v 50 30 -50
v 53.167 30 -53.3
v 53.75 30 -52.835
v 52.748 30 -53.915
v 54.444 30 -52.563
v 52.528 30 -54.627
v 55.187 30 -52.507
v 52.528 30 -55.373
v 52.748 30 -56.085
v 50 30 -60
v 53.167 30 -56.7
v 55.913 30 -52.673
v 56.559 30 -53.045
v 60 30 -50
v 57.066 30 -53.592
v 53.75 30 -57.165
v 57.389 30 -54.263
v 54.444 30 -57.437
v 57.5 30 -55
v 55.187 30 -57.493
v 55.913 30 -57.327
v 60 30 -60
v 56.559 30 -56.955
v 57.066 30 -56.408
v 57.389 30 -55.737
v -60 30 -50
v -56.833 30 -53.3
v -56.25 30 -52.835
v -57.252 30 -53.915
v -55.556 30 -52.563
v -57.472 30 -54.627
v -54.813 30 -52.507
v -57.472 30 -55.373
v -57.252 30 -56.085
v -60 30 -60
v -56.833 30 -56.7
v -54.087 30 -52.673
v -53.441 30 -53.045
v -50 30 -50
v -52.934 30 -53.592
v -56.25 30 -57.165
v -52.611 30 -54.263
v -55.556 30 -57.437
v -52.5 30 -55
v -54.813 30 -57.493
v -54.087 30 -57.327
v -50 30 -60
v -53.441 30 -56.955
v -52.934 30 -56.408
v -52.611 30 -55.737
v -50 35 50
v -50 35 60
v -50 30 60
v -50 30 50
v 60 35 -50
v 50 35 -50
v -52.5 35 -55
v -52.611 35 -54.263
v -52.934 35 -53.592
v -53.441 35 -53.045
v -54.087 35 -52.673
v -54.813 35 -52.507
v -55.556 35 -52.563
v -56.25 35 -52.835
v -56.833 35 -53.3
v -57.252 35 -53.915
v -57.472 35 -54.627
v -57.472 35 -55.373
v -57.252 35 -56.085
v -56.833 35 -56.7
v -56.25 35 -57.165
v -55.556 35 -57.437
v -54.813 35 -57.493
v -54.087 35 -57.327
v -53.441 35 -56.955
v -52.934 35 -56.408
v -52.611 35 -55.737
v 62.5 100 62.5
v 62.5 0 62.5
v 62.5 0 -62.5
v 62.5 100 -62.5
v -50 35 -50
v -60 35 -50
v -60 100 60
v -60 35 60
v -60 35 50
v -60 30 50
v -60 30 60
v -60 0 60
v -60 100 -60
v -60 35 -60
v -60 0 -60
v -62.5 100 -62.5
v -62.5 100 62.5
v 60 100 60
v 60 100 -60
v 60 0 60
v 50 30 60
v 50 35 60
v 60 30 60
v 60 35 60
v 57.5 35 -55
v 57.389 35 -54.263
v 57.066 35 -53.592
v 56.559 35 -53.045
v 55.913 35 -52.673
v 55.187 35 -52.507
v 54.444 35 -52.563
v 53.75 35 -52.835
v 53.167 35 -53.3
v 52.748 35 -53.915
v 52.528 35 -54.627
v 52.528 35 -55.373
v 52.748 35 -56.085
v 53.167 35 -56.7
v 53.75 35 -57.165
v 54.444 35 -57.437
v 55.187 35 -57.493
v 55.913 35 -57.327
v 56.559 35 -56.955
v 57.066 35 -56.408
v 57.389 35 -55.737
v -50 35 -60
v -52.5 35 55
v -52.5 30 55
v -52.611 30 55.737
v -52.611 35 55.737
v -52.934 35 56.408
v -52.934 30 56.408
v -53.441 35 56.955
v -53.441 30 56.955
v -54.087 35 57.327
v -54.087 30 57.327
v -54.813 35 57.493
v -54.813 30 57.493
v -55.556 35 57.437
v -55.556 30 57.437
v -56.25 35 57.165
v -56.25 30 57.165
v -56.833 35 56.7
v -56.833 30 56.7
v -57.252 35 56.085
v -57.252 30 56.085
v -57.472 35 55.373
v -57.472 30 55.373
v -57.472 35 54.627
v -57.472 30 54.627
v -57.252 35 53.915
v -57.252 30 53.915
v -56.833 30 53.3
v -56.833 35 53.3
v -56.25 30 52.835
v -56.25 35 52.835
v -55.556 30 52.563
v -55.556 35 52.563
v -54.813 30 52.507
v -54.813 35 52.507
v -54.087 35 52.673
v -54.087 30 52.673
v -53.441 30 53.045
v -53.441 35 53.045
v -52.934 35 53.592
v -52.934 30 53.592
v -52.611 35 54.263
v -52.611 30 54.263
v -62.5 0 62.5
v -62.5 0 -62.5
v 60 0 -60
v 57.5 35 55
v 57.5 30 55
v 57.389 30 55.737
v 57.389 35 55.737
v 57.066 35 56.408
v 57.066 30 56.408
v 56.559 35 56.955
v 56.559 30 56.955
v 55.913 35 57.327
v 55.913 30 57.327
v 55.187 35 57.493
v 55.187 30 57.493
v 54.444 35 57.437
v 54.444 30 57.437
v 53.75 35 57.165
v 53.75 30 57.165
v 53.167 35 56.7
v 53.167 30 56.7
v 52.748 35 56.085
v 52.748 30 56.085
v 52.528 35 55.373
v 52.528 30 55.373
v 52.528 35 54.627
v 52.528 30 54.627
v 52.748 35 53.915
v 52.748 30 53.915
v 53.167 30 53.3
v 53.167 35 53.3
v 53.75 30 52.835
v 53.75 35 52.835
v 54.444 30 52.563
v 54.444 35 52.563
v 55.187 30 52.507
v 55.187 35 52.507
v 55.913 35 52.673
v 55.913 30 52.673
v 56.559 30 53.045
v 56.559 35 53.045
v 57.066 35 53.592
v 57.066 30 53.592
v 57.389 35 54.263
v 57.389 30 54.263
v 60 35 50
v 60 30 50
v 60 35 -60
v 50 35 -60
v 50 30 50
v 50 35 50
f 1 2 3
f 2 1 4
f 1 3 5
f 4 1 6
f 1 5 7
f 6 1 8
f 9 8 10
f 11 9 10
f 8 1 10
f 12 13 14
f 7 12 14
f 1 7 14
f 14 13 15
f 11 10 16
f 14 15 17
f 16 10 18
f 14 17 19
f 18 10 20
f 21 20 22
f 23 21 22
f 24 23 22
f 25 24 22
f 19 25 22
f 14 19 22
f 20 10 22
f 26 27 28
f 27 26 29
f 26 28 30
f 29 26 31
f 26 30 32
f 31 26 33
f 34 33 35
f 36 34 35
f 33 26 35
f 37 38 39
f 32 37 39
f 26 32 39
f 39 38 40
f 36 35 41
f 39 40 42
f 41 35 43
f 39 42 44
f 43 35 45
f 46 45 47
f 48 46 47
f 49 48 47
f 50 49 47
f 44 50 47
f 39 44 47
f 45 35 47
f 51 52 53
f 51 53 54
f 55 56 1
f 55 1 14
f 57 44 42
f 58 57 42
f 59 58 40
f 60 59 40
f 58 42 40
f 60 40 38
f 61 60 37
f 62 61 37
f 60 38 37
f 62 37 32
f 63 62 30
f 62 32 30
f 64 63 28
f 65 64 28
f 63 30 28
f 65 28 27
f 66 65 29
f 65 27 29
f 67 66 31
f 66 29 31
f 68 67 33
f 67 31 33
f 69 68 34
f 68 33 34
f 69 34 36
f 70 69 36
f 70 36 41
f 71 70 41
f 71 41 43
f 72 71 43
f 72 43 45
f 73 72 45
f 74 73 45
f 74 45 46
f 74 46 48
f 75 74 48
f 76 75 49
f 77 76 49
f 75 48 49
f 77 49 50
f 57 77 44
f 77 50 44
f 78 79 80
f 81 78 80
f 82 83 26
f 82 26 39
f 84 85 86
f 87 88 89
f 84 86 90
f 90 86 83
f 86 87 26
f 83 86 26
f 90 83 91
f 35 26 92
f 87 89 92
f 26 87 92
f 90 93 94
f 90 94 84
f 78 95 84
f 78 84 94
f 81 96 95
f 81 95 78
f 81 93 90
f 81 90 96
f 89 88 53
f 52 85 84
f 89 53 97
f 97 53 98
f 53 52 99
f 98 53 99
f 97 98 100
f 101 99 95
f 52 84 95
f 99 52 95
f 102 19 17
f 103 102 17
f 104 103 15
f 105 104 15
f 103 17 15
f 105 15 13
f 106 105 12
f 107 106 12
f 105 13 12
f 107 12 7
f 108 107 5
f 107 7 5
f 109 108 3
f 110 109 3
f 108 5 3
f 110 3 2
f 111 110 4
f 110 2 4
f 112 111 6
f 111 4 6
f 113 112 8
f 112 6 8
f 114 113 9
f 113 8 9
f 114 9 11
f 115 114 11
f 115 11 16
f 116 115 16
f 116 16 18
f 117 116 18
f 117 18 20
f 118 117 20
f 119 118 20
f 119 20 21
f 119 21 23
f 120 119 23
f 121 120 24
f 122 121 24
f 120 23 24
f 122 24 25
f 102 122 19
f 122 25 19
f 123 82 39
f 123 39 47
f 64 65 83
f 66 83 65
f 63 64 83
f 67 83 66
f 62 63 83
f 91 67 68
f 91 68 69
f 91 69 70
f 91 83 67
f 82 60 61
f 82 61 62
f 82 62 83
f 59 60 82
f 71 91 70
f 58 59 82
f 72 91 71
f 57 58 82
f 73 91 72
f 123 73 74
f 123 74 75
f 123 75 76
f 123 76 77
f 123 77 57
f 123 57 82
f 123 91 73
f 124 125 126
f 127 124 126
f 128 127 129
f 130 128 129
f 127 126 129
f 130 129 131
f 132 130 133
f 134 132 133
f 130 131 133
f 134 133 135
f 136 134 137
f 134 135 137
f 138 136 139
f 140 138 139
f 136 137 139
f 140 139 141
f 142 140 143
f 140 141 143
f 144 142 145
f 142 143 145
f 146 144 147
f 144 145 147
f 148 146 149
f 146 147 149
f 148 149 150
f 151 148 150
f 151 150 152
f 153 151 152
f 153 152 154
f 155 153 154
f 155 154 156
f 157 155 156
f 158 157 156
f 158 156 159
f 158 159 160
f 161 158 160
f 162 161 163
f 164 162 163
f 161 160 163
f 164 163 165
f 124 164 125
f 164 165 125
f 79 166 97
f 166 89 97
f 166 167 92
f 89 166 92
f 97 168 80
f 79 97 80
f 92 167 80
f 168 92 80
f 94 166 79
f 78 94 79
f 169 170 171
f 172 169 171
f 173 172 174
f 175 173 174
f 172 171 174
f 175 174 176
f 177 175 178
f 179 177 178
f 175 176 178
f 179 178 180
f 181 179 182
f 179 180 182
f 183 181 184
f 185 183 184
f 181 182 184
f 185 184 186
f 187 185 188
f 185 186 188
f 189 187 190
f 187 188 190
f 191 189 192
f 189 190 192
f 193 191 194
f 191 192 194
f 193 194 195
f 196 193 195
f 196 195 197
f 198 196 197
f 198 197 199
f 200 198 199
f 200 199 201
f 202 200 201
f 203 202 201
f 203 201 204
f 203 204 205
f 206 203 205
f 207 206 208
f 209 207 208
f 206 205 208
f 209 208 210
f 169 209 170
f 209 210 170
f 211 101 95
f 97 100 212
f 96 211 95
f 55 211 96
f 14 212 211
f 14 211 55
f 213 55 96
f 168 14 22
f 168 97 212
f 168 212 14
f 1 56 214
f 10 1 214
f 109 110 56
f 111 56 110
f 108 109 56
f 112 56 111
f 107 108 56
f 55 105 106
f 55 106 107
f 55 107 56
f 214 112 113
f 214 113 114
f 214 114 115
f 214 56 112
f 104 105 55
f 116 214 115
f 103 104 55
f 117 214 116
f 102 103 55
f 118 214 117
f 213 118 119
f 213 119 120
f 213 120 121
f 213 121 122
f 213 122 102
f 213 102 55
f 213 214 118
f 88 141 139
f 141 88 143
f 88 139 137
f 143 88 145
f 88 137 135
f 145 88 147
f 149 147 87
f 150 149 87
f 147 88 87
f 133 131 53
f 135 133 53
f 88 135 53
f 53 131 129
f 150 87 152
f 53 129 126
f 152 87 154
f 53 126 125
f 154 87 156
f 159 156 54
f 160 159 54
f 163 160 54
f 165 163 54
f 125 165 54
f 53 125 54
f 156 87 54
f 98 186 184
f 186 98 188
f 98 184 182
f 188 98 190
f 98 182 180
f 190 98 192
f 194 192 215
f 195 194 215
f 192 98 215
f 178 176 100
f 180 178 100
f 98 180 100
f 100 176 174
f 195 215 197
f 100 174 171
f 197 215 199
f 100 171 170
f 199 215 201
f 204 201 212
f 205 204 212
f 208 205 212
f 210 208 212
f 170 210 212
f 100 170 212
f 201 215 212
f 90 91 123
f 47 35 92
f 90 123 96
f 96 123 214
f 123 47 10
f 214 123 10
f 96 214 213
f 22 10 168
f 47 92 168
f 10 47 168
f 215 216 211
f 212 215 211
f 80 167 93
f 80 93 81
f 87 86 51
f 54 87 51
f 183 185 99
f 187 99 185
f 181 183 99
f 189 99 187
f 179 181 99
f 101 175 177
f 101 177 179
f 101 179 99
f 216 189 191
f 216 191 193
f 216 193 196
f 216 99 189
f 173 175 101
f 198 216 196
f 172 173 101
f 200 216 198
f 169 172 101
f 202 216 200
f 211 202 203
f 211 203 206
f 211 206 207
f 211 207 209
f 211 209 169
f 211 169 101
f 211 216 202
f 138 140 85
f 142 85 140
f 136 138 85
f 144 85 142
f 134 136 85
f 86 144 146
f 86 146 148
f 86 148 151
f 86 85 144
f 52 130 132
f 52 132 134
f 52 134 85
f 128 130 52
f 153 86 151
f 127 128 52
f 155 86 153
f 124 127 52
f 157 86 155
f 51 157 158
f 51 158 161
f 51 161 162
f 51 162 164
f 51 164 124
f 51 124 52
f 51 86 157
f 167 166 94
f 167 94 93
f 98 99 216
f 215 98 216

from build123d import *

# Parameters (mm, degrees)
SKETCH1_W           = 125
SKETCH1_H           = 125
SKETCH1_W_2         = 120
SKETCH1_H_2         = 120
BOSS_EXTRUDE1_DEPTH = 100
SKETCH3_W           = 10
SKETCH3_H           = 10
BOSS_EXTRUDE2_DEPTH = 70
SKETCH4_R           = 2.5
CUT_EXTRUDE1_DEPTH  = 5
SKETCH5_W           = 120
SKETCH5_H           = 120
CUT_EXTRUDE2_DEPTH  = 65


with BuildPart() as part:
    # Sketch1 → Boss-Extrude1 (new body)
    with BuildSketch(Plane(origin=(0, 0, 0), x_dir=(1, 0, 0), z_dir=(0, 1, 0))):
        Rectangle(SKETCH1_W, SKETCH1_H)
        Rectangle(SKETCH1_W_2, SKETCH1_H_2, mode=Mode.SUBTRACT)
    extrude(amount=BOSS_EXTRUDE1_DEPTH)

    # Sketch3 → Boss-Extrude2 (add)
    with BuildSketch(Plane(origin=(0, 100, 0), x_dir=(1, 0, 0), z_dir=(0, 1, 0))):
        with Locations((55, 55)):
            Rectangle(SKETCH3_W, SKETCH3_H)
        with Locations((-55, 55)):
            Rectangle(SKETCH3_W, SKETCH3_H)
        with Locations((55, -55)):
            Rectangle(SKETCH3_W, SKETCH3_H)
        with Locations((-55, -55)):
            Rectangle(SKETCH3_W, SKETCH3_H)
    extrude(amount=-BOSS_EXTRUDE2_DEPTH)

    # Sketch4 → Cut-Extrude1 (cut)
    with BuildSketch(Plane.XZ.offset(-30)):
        with Locations((-55, 55)):
            Circle(SKETCH4_R)
        with Locations((55, 55)):
            Circle(SKETCH4_R)
        with Locations((55, -55)):
            Circle(SKETCH4_R)
        with Locations((-55, -55)):
            Circle(SKETCH4_R)
    extrude(amount=-CUT_EXTRUDE1_DEPTH, mode=Mode.SUBTRACT)

    # Sketch5 → Cut-Extrude2 (cut)
    with BuildSketch(Plane(origin=(0, 100, 0), x_dir=(1, 0, 0), z_dir=(0, 1, 0))):
        Rectangle(SKETCH5_W, SKETCH5_H)
    extrude(amount=-CUT_EXTRUDE2_DEPTH, mode=Mode.SUBTRACT)


solid = part.part
